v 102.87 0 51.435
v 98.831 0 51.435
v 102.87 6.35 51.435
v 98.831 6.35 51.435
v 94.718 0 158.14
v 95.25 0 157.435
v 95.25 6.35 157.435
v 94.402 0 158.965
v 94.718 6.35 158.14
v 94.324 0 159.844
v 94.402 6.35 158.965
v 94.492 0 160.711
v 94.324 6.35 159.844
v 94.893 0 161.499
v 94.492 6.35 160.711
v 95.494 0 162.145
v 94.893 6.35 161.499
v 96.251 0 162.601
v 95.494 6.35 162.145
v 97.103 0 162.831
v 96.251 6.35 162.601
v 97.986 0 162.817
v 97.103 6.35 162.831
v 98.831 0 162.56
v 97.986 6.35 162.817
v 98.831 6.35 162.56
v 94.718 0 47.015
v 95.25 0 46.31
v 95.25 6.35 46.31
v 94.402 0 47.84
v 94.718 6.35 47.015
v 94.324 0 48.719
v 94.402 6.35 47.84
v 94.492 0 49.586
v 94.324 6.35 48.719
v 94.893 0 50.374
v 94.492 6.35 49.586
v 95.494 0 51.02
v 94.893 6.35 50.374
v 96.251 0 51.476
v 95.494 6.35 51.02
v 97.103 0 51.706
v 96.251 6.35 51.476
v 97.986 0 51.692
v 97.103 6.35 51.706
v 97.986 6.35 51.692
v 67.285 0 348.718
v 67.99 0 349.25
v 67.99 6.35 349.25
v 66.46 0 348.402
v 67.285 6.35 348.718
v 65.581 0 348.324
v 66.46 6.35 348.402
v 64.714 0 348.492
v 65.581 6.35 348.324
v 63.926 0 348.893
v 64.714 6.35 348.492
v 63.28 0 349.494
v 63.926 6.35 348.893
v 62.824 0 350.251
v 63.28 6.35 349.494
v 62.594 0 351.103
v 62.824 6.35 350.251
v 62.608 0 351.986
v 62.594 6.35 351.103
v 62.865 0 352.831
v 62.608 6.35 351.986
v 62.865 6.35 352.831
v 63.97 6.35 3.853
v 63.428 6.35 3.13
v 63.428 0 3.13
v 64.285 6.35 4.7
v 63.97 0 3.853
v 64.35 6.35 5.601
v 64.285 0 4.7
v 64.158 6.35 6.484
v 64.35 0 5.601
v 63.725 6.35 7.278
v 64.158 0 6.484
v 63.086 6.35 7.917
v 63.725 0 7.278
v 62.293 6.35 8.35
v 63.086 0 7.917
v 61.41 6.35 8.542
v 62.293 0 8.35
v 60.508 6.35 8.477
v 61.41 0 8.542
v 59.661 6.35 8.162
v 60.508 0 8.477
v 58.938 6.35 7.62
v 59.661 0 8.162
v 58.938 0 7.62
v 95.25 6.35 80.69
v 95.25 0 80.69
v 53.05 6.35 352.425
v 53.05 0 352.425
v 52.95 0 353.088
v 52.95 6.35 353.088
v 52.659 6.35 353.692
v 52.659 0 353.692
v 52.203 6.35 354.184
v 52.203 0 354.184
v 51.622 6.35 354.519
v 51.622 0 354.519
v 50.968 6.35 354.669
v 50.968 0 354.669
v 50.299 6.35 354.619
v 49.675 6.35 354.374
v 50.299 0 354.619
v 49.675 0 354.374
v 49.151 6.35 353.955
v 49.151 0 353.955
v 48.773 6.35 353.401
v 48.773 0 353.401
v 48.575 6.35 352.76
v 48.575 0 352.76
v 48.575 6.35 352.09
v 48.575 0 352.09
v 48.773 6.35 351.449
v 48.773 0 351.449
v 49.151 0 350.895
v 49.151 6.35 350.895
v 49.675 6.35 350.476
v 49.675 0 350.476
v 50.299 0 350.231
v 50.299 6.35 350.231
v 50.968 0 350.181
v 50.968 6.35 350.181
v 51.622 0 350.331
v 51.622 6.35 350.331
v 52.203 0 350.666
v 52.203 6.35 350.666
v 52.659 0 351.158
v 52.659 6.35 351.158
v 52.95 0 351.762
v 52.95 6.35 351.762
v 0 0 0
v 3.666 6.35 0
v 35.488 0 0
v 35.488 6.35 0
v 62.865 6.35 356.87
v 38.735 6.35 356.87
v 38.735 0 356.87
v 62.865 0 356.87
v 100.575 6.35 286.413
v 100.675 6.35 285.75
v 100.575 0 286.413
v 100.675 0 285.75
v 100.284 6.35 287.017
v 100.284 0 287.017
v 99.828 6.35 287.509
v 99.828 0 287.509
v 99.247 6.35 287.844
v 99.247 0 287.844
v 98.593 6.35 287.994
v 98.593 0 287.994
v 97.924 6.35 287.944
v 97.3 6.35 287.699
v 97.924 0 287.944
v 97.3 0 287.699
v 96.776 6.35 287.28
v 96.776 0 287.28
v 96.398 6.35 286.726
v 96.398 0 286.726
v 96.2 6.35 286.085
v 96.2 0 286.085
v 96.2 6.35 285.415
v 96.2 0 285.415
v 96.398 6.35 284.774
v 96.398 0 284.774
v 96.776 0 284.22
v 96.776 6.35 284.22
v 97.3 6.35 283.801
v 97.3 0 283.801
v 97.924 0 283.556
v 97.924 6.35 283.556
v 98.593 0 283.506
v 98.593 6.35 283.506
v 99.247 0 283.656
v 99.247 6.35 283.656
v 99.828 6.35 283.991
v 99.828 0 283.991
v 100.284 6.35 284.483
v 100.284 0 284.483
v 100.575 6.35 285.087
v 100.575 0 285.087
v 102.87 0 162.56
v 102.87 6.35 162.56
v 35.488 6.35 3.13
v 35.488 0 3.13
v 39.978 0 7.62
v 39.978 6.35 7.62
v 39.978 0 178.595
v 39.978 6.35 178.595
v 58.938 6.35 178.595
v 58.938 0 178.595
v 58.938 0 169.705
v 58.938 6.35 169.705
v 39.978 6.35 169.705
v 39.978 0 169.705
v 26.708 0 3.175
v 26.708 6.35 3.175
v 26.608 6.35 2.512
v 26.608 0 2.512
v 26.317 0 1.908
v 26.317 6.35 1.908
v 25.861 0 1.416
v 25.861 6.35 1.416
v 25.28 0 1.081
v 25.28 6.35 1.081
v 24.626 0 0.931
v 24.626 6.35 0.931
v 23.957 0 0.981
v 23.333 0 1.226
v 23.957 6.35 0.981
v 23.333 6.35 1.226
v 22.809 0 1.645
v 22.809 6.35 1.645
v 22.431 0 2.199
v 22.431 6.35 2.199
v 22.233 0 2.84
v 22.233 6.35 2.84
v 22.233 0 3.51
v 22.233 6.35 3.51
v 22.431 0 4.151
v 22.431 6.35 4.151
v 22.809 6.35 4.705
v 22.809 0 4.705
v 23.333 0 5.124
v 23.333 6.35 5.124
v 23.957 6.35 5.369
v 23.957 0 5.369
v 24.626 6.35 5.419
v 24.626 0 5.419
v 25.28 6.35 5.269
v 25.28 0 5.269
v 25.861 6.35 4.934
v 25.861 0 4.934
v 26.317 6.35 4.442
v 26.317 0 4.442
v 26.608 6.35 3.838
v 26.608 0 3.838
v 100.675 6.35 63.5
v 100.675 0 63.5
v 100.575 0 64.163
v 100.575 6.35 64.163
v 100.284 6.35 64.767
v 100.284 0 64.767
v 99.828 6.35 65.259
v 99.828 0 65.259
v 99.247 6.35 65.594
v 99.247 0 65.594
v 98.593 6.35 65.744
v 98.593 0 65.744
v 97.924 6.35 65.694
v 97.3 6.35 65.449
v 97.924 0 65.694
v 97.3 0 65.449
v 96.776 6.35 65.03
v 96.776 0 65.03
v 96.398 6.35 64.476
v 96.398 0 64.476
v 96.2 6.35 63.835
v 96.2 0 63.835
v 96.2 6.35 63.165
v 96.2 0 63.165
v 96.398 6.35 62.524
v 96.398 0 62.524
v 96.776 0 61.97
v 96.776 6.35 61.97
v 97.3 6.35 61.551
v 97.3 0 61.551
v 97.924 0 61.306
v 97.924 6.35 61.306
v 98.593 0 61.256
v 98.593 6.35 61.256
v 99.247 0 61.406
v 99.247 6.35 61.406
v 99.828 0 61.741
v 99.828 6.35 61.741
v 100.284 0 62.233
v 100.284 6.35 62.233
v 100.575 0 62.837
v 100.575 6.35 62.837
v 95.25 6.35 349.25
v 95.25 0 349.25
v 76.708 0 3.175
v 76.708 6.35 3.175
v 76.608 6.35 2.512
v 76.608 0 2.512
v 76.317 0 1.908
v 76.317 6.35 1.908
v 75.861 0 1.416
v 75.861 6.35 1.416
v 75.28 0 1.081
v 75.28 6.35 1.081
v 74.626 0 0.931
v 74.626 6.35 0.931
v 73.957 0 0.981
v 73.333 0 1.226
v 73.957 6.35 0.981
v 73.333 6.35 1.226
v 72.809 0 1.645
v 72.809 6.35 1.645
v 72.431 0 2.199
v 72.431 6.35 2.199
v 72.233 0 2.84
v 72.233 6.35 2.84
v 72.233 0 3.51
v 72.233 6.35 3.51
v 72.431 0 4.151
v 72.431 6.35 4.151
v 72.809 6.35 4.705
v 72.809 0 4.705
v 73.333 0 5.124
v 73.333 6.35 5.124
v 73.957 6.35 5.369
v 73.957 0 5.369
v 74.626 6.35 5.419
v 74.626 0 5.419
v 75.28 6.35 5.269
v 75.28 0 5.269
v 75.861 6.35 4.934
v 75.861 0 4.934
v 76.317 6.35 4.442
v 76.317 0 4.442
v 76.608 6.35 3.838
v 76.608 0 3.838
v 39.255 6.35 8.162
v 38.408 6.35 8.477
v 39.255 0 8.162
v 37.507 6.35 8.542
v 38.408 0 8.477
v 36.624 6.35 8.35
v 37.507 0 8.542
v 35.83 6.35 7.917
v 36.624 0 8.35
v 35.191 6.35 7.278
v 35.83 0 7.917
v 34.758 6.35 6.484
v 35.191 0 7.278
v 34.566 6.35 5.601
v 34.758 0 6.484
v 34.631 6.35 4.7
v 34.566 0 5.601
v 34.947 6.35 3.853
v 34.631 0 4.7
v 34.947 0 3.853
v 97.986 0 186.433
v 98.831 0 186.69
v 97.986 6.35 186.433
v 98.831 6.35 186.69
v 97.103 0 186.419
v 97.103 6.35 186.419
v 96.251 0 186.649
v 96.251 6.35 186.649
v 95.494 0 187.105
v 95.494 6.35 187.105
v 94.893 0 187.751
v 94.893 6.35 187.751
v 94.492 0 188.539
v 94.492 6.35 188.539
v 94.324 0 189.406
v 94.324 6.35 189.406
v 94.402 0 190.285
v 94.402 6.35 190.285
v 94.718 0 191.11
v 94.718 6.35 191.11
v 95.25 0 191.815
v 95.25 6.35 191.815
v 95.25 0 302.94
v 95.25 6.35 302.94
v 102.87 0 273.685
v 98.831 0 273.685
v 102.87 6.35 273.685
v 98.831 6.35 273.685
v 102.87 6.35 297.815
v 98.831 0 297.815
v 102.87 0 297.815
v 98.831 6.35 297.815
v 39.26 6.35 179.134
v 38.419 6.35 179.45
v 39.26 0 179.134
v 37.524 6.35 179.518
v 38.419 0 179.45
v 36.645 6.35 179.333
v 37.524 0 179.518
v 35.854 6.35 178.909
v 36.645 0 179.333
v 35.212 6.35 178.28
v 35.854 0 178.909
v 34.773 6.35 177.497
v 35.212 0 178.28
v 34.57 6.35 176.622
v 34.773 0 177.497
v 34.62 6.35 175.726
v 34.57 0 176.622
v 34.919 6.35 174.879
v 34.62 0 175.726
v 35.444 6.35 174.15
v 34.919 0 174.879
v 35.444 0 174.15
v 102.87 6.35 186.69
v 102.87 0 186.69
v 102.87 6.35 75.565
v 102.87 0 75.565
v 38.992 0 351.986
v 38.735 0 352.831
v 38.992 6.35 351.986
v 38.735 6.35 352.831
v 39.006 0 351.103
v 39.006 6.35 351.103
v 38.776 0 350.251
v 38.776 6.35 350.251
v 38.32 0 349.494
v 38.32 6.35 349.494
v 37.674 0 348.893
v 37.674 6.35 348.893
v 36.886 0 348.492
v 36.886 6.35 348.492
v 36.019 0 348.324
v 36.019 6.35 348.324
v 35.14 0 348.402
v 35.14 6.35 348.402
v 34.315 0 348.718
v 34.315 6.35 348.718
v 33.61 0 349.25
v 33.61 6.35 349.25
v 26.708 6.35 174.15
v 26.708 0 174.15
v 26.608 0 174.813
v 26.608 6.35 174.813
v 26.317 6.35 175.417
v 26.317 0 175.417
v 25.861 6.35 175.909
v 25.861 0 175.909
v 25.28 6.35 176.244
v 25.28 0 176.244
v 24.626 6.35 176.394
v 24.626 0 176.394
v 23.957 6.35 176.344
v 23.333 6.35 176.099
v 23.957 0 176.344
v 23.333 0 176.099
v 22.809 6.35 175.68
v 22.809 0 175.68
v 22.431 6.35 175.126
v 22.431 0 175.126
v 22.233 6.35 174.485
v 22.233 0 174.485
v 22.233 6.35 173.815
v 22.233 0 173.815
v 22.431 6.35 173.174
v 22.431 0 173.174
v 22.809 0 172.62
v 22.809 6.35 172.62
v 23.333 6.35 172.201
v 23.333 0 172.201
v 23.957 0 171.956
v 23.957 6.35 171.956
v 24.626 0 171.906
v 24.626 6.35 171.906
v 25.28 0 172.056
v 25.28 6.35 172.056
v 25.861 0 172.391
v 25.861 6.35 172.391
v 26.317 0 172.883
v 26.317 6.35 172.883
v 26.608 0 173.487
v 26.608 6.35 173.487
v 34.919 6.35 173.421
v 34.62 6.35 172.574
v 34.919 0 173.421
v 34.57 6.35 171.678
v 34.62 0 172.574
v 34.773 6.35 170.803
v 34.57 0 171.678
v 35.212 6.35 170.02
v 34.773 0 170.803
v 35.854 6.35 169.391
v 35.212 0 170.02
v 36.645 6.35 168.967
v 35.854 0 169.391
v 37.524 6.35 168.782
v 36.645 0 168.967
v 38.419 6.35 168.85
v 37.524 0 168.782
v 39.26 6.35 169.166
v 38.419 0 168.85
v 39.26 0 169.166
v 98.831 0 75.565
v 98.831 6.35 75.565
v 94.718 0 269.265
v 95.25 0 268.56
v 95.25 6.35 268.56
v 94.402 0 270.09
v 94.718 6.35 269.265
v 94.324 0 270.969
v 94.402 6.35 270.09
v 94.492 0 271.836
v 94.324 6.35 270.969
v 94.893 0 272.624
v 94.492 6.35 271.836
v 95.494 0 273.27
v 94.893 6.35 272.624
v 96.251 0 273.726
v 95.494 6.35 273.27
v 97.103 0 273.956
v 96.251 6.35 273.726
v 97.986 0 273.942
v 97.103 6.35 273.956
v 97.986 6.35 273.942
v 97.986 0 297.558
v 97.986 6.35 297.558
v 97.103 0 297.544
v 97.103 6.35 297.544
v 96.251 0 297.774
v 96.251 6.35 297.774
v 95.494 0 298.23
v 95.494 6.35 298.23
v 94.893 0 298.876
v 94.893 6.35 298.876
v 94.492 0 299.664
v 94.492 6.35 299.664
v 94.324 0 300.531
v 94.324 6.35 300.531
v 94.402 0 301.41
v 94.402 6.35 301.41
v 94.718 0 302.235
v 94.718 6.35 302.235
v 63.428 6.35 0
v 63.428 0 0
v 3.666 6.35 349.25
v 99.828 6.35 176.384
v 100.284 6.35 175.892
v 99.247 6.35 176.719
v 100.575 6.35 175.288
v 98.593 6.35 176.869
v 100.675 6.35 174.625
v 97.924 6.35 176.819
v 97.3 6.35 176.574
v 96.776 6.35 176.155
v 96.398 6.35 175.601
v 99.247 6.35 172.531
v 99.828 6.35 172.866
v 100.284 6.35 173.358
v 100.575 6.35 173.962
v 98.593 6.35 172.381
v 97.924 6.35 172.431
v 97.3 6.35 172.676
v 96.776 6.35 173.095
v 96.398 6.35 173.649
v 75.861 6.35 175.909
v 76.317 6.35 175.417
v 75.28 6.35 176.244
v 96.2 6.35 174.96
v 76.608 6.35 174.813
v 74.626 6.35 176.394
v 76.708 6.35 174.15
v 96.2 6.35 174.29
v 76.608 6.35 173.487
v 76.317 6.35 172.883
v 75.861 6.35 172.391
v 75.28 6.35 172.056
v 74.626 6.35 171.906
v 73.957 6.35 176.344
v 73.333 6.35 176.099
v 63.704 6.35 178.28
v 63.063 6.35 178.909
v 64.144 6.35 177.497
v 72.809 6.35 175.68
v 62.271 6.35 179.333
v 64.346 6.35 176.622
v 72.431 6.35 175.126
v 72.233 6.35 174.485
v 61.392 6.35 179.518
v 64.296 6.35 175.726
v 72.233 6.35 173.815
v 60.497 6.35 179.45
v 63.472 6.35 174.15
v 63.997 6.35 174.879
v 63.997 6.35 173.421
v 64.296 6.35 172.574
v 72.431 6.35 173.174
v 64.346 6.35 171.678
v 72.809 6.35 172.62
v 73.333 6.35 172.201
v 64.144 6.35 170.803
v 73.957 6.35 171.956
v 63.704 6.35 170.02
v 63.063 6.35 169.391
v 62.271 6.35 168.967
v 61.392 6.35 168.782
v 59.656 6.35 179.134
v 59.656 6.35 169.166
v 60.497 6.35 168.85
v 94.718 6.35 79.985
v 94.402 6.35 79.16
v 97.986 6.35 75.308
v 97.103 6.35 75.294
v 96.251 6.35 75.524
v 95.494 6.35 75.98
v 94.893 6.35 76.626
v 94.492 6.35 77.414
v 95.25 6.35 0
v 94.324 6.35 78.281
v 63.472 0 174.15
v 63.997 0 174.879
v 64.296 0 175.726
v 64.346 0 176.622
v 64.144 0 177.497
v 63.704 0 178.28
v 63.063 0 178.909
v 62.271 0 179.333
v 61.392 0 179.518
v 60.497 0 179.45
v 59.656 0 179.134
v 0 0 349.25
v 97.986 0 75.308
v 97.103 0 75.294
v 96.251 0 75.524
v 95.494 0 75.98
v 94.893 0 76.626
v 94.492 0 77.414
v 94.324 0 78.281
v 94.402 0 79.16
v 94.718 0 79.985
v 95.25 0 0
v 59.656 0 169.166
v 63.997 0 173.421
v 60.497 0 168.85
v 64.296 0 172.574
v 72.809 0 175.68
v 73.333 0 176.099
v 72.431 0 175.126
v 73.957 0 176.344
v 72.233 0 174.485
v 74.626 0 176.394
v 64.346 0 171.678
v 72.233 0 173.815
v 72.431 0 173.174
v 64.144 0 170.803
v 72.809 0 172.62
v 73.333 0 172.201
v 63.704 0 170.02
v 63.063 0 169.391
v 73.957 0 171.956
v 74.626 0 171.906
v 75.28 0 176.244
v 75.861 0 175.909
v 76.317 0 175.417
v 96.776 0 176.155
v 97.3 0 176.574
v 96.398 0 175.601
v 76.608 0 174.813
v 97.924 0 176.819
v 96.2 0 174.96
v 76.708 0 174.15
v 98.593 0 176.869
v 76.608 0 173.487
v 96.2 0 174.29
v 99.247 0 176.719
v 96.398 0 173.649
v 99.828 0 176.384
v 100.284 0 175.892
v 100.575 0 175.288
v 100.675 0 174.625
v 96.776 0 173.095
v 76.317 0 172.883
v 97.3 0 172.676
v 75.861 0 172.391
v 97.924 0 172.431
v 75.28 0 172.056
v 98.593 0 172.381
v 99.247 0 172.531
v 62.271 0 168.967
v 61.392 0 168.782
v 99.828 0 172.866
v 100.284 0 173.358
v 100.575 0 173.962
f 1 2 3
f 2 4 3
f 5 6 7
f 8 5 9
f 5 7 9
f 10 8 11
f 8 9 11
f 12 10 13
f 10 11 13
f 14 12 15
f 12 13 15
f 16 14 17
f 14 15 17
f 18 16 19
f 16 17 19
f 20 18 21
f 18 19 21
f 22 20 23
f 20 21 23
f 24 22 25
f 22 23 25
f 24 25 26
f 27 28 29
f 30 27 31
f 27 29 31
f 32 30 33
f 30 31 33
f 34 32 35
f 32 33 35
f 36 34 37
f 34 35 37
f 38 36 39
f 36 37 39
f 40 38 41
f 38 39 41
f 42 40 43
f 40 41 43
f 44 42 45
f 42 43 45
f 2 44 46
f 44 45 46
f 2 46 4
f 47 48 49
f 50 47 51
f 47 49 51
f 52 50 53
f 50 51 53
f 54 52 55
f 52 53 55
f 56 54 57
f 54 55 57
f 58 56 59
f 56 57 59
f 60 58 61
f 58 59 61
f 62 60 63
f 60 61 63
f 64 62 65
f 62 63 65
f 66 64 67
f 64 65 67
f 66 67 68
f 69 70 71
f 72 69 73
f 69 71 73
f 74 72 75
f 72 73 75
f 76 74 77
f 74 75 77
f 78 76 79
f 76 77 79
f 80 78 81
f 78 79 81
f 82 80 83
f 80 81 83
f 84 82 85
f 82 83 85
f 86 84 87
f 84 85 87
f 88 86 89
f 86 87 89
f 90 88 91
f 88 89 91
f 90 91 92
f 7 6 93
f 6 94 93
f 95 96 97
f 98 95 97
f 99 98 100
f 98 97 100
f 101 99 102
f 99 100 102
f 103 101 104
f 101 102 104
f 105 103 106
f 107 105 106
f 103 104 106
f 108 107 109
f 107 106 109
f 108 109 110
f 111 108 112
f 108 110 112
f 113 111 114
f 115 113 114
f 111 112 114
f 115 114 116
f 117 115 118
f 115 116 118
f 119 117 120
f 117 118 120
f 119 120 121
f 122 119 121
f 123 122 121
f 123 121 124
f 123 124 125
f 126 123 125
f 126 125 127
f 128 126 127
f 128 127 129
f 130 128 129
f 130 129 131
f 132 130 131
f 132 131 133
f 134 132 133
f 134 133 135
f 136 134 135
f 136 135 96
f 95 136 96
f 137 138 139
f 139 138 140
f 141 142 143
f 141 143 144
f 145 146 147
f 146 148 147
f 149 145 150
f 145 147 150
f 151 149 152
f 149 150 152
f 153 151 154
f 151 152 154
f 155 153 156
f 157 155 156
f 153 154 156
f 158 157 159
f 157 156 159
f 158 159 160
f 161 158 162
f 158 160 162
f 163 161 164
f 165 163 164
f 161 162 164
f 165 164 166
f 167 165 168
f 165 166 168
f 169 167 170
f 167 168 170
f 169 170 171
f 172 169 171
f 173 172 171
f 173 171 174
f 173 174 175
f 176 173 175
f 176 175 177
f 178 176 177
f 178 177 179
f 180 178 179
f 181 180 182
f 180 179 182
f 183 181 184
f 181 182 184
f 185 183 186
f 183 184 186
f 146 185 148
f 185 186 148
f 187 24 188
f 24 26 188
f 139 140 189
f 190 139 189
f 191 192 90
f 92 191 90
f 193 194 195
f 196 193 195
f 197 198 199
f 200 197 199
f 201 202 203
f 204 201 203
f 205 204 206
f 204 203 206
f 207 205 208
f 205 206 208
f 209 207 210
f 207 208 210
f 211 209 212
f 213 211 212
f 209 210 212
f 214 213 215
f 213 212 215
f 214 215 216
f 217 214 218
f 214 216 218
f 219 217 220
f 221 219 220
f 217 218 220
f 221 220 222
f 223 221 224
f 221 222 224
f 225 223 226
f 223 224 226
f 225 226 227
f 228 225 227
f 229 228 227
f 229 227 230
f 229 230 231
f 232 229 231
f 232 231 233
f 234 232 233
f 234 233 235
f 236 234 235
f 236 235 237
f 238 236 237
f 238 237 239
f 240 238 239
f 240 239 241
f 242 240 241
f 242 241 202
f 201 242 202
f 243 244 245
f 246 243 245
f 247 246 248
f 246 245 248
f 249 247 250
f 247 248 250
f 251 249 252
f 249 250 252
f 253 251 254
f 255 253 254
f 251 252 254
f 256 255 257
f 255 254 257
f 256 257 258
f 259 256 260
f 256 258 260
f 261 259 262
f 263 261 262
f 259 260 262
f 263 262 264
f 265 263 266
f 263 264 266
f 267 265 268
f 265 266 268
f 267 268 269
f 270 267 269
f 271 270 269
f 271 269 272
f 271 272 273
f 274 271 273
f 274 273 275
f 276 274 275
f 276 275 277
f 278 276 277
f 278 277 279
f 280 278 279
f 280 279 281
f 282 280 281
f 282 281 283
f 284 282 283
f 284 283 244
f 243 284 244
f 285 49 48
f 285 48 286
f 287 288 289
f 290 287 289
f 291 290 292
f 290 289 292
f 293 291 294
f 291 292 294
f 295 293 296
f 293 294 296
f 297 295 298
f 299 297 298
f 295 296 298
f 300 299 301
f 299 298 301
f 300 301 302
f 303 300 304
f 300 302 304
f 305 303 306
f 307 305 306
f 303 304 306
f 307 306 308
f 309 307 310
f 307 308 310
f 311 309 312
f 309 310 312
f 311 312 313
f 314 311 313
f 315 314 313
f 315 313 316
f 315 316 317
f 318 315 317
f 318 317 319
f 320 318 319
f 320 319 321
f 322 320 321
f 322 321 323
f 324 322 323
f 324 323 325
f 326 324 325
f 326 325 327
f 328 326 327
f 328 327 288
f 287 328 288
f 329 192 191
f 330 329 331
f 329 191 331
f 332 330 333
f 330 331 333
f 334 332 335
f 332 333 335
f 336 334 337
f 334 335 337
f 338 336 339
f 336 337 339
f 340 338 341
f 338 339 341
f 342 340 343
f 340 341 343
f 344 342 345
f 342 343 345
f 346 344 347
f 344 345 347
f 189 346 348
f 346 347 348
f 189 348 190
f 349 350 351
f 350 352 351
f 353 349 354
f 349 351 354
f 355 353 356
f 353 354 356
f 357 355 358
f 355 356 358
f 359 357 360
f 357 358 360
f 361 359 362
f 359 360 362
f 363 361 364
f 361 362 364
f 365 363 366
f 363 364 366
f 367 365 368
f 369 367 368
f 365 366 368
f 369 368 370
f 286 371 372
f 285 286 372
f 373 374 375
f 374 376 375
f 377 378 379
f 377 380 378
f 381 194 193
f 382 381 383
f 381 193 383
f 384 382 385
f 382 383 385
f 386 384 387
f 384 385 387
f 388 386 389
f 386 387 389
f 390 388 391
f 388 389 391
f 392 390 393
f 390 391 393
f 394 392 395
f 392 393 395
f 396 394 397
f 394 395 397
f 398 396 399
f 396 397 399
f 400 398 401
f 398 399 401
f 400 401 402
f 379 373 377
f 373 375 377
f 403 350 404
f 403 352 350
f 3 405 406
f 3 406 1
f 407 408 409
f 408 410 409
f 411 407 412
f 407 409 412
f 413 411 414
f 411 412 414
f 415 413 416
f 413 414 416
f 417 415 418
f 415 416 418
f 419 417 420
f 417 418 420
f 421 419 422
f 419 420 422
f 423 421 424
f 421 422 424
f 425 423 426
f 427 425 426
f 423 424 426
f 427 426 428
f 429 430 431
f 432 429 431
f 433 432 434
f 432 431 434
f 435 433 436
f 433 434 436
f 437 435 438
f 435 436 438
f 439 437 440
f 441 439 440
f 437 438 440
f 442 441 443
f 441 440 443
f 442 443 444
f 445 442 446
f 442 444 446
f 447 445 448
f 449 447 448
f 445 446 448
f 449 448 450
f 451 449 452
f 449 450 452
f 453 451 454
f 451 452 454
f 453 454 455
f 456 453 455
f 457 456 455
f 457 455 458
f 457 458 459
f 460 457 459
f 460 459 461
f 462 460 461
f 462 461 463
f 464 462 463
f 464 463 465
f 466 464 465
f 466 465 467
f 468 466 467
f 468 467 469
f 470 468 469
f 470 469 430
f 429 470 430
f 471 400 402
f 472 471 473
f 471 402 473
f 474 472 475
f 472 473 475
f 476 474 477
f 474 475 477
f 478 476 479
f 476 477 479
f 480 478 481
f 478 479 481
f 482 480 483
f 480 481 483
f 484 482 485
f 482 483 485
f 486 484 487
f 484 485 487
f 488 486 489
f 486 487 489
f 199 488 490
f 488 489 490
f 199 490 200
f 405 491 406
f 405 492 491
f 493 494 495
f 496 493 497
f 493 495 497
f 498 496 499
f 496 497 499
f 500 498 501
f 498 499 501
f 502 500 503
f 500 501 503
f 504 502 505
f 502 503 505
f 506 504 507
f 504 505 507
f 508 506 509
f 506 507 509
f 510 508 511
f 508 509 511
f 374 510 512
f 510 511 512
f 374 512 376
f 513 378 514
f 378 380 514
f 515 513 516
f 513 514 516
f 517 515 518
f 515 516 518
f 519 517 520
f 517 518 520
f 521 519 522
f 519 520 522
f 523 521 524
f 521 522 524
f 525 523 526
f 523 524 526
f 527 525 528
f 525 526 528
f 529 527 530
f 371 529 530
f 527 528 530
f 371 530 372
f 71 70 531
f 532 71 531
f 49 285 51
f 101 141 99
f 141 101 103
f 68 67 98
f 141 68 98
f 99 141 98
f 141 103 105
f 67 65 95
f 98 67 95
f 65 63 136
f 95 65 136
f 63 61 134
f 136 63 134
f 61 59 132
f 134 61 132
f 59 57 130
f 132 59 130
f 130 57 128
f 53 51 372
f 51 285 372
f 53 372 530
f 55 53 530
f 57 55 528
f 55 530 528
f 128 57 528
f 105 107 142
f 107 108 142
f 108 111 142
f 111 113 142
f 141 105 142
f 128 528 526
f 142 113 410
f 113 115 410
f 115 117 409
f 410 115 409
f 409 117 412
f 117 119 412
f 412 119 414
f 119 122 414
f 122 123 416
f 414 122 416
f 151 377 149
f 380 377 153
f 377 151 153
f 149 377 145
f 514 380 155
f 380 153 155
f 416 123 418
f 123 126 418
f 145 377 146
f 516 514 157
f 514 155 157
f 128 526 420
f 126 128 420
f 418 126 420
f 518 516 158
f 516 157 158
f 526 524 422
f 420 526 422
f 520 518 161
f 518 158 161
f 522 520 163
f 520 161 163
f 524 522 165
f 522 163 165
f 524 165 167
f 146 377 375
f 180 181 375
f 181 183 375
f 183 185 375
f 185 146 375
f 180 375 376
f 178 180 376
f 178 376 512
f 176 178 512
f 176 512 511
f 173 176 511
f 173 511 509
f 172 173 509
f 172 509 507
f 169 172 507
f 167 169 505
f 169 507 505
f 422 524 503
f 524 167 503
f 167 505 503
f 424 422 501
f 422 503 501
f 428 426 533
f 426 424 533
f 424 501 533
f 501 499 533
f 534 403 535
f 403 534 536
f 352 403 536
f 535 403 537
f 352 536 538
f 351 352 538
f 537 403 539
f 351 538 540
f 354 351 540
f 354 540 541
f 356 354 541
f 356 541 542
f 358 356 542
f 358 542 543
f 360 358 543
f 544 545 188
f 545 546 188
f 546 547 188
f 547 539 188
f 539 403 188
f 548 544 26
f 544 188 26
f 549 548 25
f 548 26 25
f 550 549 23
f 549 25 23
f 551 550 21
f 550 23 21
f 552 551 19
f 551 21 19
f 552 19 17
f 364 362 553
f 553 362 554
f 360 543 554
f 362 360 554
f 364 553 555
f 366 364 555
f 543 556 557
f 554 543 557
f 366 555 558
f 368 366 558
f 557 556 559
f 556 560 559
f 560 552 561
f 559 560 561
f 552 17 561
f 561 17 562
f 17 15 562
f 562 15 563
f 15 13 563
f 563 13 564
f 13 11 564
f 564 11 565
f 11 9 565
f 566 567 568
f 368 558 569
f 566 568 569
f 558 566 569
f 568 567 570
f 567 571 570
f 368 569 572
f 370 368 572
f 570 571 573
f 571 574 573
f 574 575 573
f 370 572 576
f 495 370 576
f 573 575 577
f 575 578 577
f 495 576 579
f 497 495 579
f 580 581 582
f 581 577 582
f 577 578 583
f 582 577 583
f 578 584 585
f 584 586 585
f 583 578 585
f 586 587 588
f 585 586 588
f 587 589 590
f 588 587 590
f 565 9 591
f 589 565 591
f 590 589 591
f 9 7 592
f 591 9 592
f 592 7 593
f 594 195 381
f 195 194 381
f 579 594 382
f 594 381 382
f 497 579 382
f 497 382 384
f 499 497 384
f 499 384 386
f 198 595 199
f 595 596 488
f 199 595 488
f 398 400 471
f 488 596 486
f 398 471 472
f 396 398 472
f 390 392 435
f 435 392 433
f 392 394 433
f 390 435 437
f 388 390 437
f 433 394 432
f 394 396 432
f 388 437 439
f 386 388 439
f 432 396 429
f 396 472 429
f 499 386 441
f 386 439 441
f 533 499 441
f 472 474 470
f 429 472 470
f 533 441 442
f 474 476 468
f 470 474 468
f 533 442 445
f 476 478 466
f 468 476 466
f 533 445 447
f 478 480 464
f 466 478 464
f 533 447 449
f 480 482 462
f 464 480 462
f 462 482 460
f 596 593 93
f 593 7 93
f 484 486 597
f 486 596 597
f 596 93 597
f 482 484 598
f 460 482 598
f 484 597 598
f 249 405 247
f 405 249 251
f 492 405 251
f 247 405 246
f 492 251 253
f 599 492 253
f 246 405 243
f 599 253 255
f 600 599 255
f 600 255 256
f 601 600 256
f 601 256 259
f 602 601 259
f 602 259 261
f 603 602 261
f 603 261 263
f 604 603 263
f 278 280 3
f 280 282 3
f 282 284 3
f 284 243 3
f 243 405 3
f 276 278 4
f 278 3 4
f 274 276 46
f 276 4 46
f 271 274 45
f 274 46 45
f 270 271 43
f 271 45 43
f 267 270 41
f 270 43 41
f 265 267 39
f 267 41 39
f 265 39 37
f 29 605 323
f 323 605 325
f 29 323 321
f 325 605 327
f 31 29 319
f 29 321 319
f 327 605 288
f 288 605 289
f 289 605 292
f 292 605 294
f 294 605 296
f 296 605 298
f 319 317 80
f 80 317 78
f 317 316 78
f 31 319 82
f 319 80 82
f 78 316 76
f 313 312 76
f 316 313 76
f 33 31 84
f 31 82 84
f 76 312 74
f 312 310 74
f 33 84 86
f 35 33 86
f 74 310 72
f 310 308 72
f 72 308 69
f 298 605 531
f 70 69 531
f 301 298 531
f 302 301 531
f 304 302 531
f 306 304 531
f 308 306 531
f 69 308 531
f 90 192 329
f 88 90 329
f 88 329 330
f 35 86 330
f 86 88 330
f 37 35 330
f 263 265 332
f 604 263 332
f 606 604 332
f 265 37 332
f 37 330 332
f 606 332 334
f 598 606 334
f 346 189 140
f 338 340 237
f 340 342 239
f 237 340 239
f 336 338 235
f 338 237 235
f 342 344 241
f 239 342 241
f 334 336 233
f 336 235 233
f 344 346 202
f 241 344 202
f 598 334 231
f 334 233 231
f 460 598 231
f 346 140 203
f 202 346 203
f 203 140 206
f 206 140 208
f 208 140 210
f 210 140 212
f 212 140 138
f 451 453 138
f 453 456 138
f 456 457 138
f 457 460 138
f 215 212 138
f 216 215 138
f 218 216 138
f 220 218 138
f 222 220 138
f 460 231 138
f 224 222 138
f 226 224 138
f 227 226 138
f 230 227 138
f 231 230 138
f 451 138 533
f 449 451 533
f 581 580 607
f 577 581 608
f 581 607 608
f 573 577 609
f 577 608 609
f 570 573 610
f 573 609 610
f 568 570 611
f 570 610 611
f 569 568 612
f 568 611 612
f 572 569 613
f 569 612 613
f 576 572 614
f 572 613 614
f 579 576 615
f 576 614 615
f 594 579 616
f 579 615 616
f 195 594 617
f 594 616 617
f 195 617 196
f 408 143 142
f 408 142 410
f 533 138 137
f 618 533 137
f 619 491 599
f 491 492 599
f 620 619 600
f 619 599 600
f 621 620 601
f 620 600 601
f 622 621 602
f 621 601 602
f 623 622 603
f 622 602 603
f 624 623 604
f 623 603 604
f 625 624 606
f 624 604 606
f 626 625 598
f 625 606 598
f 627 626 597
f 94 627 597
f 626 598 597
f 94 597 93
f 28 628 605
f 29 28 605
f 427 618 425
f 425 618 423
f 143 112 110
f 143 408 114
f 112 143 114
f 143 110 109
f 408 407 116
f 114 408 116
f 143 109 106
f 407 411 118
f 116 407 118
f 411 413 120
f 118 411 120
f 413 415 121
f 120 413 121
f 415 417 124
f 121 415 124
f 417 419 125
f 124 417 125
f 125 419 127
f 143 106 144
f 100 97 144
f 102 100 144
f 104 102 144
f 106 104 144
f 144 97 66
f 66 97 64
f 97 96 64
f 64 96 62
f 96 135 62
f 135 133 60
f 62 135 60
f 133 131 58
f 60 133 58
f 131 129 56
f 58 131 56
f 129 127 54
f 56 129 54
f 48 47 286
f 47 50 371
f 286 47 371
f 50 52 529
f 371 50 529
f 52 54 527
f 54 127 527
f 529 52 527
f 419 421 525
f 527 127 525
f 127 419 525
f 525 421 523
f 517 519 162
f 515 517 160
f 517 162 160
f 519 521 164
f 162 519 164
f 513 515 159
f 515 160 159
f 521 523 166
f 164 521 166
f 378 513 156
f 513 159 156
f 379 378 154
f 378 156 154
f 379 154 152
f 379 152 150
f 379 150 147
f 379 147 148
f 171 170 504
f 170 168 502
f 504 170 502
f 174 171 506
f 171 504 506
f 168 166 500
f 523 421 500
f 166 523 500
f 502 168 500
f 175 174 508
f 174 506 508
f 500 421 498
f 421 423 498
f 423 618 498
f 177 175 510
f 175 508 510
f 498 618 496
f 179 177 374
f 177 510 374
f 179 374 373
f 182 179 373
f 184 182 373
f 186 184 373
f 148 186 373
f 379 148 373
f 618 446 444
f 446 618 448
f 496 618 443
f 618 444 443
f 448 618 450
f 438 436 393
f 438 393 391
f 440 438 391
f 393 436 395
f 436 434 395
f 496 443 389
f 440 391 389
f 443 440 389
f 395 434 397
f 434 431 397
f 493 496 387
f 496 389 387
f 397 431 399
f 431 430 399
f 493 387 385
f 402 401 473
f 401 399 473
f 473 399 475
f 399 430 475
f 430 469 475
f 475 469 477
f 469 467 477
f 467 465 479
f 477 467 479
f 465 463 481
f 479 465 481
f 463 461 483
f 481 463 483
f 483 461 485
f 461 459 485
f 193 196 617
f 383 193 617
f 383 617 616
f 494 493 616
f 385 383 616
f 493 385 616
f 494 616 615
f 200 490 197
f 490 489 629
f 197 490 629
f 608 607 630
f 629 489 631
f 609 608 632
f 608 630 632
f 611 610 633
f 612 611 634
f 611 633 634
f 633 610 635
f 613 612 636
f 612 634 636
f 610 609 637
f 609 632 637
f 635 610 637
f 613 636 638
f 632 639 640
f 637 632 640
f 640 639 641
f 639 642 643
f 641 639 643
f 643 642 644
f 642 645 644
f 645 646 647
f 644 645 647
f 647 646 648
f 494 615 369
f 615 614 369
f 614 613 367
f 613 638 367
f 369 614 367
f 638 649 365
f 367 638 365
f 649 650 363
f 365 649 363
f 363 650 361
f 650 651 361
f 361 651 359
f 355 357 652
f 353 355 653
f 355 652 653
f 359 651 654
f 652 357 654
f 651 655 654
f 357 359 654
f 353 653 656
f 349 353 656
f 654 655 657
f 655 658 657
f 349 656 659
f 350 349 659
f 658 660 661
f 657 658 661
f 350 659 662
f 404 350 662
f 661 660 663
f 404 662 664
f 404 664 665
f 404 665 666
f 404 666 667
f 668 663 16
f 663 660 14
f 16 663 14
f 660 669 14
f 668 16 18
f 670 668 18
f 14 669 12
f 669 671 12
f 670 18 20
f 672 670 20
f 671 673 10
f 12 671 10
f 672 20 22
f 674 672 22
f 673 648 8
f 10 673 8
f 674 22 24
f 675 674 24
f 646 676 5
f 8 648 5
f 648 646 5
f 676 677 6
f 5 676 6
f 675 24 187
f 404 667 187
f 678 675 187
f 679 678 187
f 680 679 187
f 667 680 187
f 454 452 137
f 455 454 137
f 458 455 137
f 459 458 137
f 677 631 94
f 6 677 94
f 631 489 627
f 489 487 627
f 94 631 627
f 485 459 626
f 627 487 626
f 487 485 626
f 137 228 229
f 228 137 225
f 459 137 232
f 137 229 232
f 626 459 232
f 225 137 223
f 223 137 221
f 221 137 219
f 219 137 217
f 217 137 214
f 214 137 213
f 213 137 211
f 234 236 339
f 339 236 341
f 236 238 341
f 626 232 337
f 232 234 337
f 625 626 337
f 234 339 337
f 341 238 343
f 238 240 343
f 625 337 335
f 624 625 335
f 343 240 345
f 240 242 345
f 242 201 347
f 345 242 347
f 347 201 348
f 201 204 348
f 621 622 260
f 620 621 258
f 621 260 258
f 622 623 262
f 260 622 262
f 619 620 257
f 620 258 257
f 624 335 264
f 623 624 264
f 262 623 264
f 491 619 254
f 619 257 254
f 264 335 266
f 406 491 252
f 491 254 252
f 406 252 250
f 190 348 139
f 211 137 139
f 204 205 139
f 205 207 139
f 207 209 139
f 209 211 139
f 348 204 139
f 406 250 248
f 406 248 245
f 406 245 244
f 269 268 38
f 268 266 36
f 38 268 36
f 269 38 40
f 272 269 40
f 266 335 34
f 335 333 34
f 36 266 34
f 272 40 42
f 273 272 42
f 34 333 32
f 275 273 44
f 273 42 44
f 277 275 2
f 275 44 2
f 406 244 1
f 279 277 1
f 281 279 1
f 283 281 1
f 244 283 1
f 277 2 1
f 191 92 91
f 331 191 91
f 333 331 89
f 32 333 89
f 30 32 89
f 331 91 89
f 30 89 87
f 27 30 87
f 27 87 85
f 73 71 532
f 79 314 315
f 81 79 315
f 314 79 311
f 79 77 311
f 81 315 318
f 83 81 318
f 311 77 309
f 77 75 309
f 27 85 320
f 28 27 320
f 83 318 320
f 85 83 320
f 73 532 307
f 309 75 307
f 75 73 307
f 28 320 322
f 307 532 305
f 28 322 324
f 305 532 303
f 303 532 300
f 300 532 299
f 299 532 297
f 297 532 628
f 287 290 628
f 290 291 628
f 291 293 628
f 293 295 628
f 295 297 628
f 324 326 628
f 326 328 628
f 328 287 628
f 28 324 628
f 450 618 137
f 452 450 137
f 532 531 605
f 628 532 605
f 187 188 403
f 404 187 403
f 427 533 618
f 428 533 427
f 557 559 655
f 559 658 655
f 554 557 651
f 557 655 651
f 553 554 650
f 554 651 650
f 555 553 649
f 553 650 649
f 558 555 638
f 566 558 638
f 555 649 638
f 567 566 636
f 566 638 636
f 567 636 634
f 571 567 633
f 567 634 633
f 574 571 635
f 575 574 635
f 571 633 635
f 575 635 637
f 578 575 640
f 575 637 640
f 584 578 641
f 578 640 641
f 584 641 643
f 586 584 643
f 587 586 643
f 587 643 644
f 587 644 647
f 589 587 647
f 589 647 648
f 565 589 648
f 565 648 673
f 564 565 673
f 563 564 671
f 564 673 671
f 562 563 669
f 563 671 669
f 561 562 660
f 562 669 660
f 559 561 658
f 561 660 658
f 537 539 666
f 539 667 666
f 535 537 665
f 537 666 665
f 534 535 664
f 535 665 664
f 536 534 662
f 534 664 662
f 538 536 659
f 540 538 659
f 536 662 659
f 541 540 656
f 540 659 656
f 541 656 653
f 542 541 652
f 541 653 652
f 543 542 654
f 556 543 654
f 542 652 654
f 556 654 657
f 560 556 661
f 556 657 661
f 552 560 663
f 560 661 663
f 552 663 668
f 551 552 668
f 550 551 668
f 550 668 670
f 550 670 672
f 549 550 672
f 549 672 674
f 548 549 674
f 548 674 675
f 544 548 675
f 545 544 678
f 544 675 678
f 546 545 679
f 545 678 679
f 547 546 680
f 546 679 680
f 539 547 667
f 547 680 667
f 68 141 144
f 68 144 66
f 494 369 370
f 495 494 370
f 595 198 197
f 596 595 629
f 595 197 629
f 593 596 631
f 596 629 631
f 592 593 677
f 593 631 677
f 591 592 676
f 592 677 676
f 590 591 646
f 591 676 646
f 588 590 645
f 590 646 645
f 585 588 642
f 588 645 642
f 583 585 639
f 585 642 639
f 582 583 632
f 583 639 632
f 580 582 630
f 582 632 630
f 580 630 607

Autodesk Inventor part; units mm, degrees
ref_plane "YZ Plane" through (0, 0, 0) normal (1, 0, 0) x (0, 1, 0)
ref_plane "XZ Plane" through (0, 0, 0) normal (0, 1, 0) x (-1, 0, 0)
ref_plane "XY Plane" through (0, 0, 0) normal (0, 0, 1) x (1, 0, 0)
sketch "Sketch1" plane through (0, 0, 0) normal (0, 0, 1) x (1, 0, 0)
  line L0 (0, 0) -> (95.25, 0)
  line L1 (95.25, 0) -> (95.25, 6.35)
  line L2 (95.25, 6.35) -> (3.6662, 6.35)
  line L3 (3.6662, 6.35) -> (0, 0)
  dimension "d0" = 95.25
  dimension "d1" = 6.35
  dimension "d2" = 60
extrude "Extrusion1" add sketch "Sketch1" along normal blind 349.25
sketch "Sketch2" plane through (0, 0, 0) normal (0, -1, 0) x (1, 0, 0)
  line L0 (38.1, 349.25) -> (63.5, 349.25)
  line L1 (63.5, 349.25) -> (63.5, 355.6)
  line L2 (63.5, 355.6) -> (38.1, 355.6)
  line L3 (38.1, 355.6) -> (38.1, 349.25)
  line L4 (0, 349.25) -> (101.6, 349.25)
  line L5 (0, 349.25) -> (95.25, 349.25) projected
  point P0 (0, 0)
  point P1 (50.8, 349.25)
  dimension "d5" = 25.4
  dimension "d6" = 6.35
  dimension "d9" = 101.6
extrude "Extrusion2" add sketch "Sketch2" against normal blind 6.35
sketch "Sketch3" plane through (0, 0, 0) normal (0, -1, 0) x (1, 0, 0)
  line L0 (63.5, 349.25) -> (63.5, 355.6) projected
  line L1 (63.5, 355.6) -> (38.1, 355.6) projected
  circle A0 centre (50.8, 352.425) radius 2.25
  point P0 (0, 0)
  point P1 (50.8, 355.6)
  point P2 (63.5, 352.425)
  dimension "d10" = 4.5
extrude "Extrusion3" cut sketch "Sketch3" against normal through all
sketch "Sketch4" plane through (0, 0, 0) normal (0, -1, 0) x (1, 0, 0)
  line L0 (95.25, 0) -> (95.25, 349.25) projected
  line L1 (95.25, 50.8) -> (101.6, 50.8)
  line L2 (101.6, 50.8) -> (101.6, 76.2)
  line L3 (101.6, 76.2) -> (95.25, 76.2)
  line L4 (95.25, 76.2) -> (95.25, 50.8)
  line L5 (95.25, 298.45) -> (101.6, 298.45)
  line L6 (101.6, 298.45) -> (101.6, 273.05)
  line L7 (101.6, 273.05) -> (95.25, 273.05)
  line L8 (95.25, 273.05) -> (95.25, 298.45)
  line L9 (95.25, 187.325) -> (101.6, 187.325)
  line L10 (101.6, 187.325) -> (101.6, 161.925)
  line L11 (101.6, 161.925) -> (95.25, 161.925)
  line L12 (95.25, 161.925) -> (95.25, 187.325)
  circle A0 centre (98.425, 285.75) radius 2.25
  circle A1 centre (98.425, 174.625) radius 2.25
  circle A2 centre (98.425, 63.5) radius 2.25
  point P0 (0, 0)
  point P1 (95.25, 174.625)
  point P2 (98.425, 298.45)
  point P3 (98.425, 187.325)
  point P4 (98.425, 76.2)
  point P5 (101.6, 285.75)
  point P6 (101.6, 174.625)
  point P7 (101.6, 63.5)
  dimension "d14" = 25.4
  dimension "d15" = 6.35
  dimension "d16" = 25.4
  dimension "d18" = 25.4
  dimension "d19" = 50.8
  dimension "d20" = 50.8
  dimension "d21" = 4.5
  dimension "d22" = 4.5
  dimension "d23" = 4.5
extrude "Extrusion4" add sketch "Sketch4" against normal blind 6.35
sketch "Sketch6" plane through (95.25, 0, 298.45) normal (0, 0, 1) x (1, 0, 0)
  line L0 (-95.25, 0) -> (-84.2515, 6.35)
  line L1 (0, 6.35) -> (-91.5838, 6.35) projected
  line L2 (-95.25, 0) -> (0, 0) projected
  line L3 (-84.2515, 6.35) -> (-84.2515, 0)
  line L4 (-91.5838, 6.35) -> (-95.25, 0) projected
  line L5 (-84.2515, 6.35) -> (-84.2515, 6.35)
  line L6 (-84.2515, 6.35) -> (-91.5838, 6.35)
  dimension "d28" = 30
  dimension "d31" = 12.7
extrude "Extrusion6" [suppressed]
sketch "Sketch7" plane through (95.25, 0, 187.325) normal (0, 0, 1) x (1, 0, 0)
  line L0 (-77.9015, 12.7) -> (-77.9015, 6.35) projected
  line L1 (-81.5677, 12.7) -> (-77.9015, 12.7) projected
  line L2 (-88.9, 0) -> (-81.5677, 12.7) projected
  line L3 (-77.9015, 6.35) -> (-88.9, 0) projected
  point P0 (-95.25, 0)
extrude "Extrusion7" [suppressed]
sketch "Sketch8" plane through (95.25, 0, 76.2) normal (0, 0, 1) x (1, 0, 0)
  line L0 (-77.9015, 12.7) -> (-77.9015, 6.35) projected
  line L1 (-81.5677, 12.7) -> (-77.9015, 12.7) projected
  line L2 (-88.9, 0) -> (-81.5677, 12.7) projected
  line L3 (-77.9015, 6.35) -> (-88.9, 0) projected
  point P0 (-95.25, 0)
extrude "Extrusion8" [suppressed]
sketch "Sketch10" plane through (3.6662, 6.35, 0) normal (0, 1, 0) x (1, 0, 0)
  circle A0 centre (20.7919, -3.175) radius 2.25
  line L0 (90.648, -6.35) -> (0.9358, -6.35)
  circle A1 centre (70.7919, -3.175) radius 2.25
  line L1 (33.0919, -6.35) -> (58.4919, -6.35)
  line L2 (58.4919, -6.35) -> (58.4919, 0)
  line L3 (58.4919, 0) -> (33.0919, 0)
  line L4 (33.0919, 0) -> (33.0919, -6.35)
  line L5 (20.7919, -3.175) -> (70.7919, -3.175) construction
  line L6 (91.5838, 0) -> (0, 0) projected
  point P0 (-3.6662, 0)
  point P1 (45.7919, -3.175)
  point P2 (45.7919, -6.35)
  point P3 (45.7919, -6.35)
  point P4 (45.7919, 0)
  point P5 (33.0919, -3.175)
  dimension "d39" = 4.5
  dimension "d41" = 4.5
  dimension "d42" = 25.4
  dimension "d43" = 6.35
  dimension "d44" = 50
extrude "Extrusion10" cut sketch "Sketch10" against normal through all
sketch "Sketch11" plane through (38.1, 0, 355.6) normal (0, -1, 0) x (1, 0, 0)
  line L0 (24.0581, -184.625) -> (-1.3419, -184.625)
  line L1 (-1.3419, -184.625) -> (-1.3419, -178.275)
  line L2 (-1.3419, -178.275) -> (24.0581, -178.275)
  line L3 (24.0581, -178.275) -> (24.0581, -184.625)
  line L4 (63.5, -168.275) -> (57.15, -168.275) projected
  line L5 (-1.3419, -349.25) -> (24.0581, -349.25) projected
  point P0 (-38.1, -355.6)
  point P1 (11.3581, -184.625)
  point P2 (11.3581, -349.25)
  dimension "d47" = 25.4
  dimension "d48" = 6.35
  dimension "d85" = 10
extrude "Extrusion11" cut sketch "Sketch11" against normal through all
sketch "Sketch12" plane through (38.1, 0, 355.6) normal (0, -1, 0) x (1, 0, 0)
  circle A0 centre (-13.6419, -181.45) radius 2.25
  circle A1 centre (36.3581, -181.45) radius 2.25
  circle A2 centre (-13.6419, -352.425) radius 2.25 projected
  circle A3 centre (36.3581, -352.425) radius 2.25 projected
  line L0 (24.0581, -178.275) -> (24.0581, -184.625) projected
  point P0 (-38.1, -355.6)
  point P1 (24.0581, -181.45)
  dimension "d52" = 4.5
  dimension "d53" = 4.5
extrude "Extrusion12" cut sketch "Sketch12" against normal through all contours A0 | A1
sketch "Sketch13" plane through (3.6662, 6.35, 349.25) normal (0, 1, 0) x (1, 0, 0)
  line L0 (58.4919, 349.25) -> (91.5838, 349.25) projected
  line L1 (59.7619, 349.25) -> (31.8219, 349.25)
  line L2 (31.8219, 349.25) -> (31.8219, 341.63)
  line L3 (31.8219, 341.63) -> (59.7619, 341.63)
  line L4 (59.7619, 341.63) -> (59.7619, 349.25)
  line L5 (59.7619, 179.545) -> (31.8219, 179.545)
  line L6 (31.8219, 179.545) -> (31.8219, 170.655)
  line L7 (31.8219, 170.655) -> (59.7619, 170.655)
  line L8 (59.7619, 170.655) -> (59.7619, 179.545)
  line L9 (58.4919, 342.9) -> (33.0919, 342.9) projected
  line L10 (33.0919, 178.275) -> (58.4919, 178.275) projected
  line L11 (58.4919, 178.275) -> (58.4919, 171.925) projected
  circle A0 centre (62.0789, -2.2451) radius 3.175
  circle A1 centre (32.1888, -2.2451) radius 3.175
  circle A2 centre (93.8289, 48.5549) radius 3.175
  circle A3 centre (93.8289, 78.4451) radius 3.175
  circle A4 centre (93.8289, 159.6799) radius 3.175
  circle A5 centre (93.8289, 189.5701) radius 3.175
  circle A6 centre (93.8289, 270.8049) radius 3.175
  circle A7 centre (93.8289, 300.6951) radius 3.175
  line L12 (97.9338, 298.45) -> (91.5838, 298.45) projected
  line L13 (91.5838, 298.45) -> (93.8289, 300.6951)
  line L14 (62.0789, -2.2451) -> (59.8338, 0) construction
  line L15 (59.8338, -6.35) -> (59.8338, 0) projected
  point P0 (-3.6662, 349.25)
  point P1 (45.7919, 342.9)
  point P2 (45.7919, 341.63)
  point P3 (45.7919, 178.275)
  point P4 (45.7919, 179.545)
  point P5 (58.4919, 175.1)
  point P6 (59.7619, 175.1)
  point P7 (91.5838, 273.05)
  point P8 (91.5838, 187.325)
  point P9 (91.5838, 161.925)
  point P10 (91.5838, 50.8)
  point P11 (91.5838, 76.2)
  point P12 (34.4338, 0)
  dimension "d61" = 6.35
  dimension "d62" = 6.35
  dimension "d63" = 6.35
  dimension "d64" = 6.35
  dimension "d65" = 6.35
  dimension "d66" = 6.35
  dimension "d67" = 6.35
  dimension "d68" = 6.35
  dimension "d56" = 1.27
  dimension "d57" = 1.27
  dimension "d58" = 1.27
  dimension "d69" = 45
  dimension "d70" = 45
extrude "Extrusion13" cut sketch "Sketch13" against normal through all
sketch "Sketch14" plane through (3.6662, 6.35, 349.25) normal (0, 1, 0) x (1, 0, 0)
  line L0 (97.9338, 50.8) -> (96.074, 50.8) projected
  line L1 (97.9338, 50.8) -> (95.1652, 50.8)
  line L2 (95.1652, 50.8) -> (95.1652, 51.435)
  line L3 (95.1652, 51.435) -> (97.9338, 51.435)
  line L4 (97.9338, 51.435) -> (97.9338, 50.8)
  line L5 (97.9338, 50.8) -> (97.9338, 76.2) projected
  line L6 (97.9338, 76.2) -> (95.1652, 76.2)
  line L7 (95.1652, 76.2) -> (95.1652, 75.565)
  line L8 (95.1652, 75.565) -> (97.9338, 75.565)
  line L9 (97.9338, 75.565) -> (97.9338, 76.2)
  line L10 (97.9338, 161.925) -> (96.074, 161.925) projected
  line L11 (97.9338, 161.925) -> (95.1652, 161.925)
  line L12 (95.1652, 161.925) -> (95.1652, 162.56)
  line L13 (95.1652, 162.56) -> (97.9338, 162.56)
  line L14 (97.9338, 162.56) -> (97.9338, 161.925)
  line L15 (96.074, 187.325) -> (97.9338, 187.325) projected
  line L16 (97.9338, 187.325) -> (95.1652, 187.325)
  line L17 (95.1652, 187.325) -> (95.1652, 186.69)
  line L18 (95.1652, 186.69) -> (97.9338, 186.69)
  line L19 (97.9338, 186.69) -> (97.9338, 187.325)
  line L20 (97.9338, 273.05) -> (97.9338, 298.45) projected
  line L21 (97.9338, 273.05) -> (95.1652, 273.05)
  line L22 (95.1652, 273.05) -> (95.1652, 273.685)
  line L23 (95.1652, 273.685) -> (97.9338, 273.685)
  line L24 (97.9338, 273.685) -> (97.9338, 273.05)
  line L25 (97.9338, 298.45) -> (95.1652, 298.45)
  line L26 (95.1652, 298.45) -> (95.1652, 297.815)
  line L27 (95.1652, 297.815) -> (97.9338, 297.815)
  line L28 (97.9338, 297.815) -> (97.9338, 298.45)
  arc A0 (91.5838, 302.9401) -> (96.074, 298.45) centre (93.8289, 300.6951) ccw projected
  line L29 (34.4338, -6.35) -> (59.8338, -6.35) projected
  arc A1 (64.324, 0) -> (59.8338, -4.4901) centre (62.0789, -2.2451) ccw projected
  line L30 (59.8338, -6.35) -> (59.1988, -6.35)
  line L31 (59.1988, -6.35) -> (59.1988, -3.5814)
  line L32 (59.1988, -3.5814) -> (59.8338, -3.5814)
  line L33 (59.8338, -3.5814) -> (59.8338, -6.35)
  line L34 (34.4338, -4.4901) -> (34.4338, -6.35) projected
  arc A2 (34.4338, -4.4901) -> (29.9437, 0) centre (32.1888, -2.2451) ccw projected
  line L35 (34.4338, -6.35) -> (35.0688, -6.35)
  line L36 (35.0688, -6.35) -> (35.0688, -3.5814)
  line L37 (35.0688, -3.5814) -> (34.4338, -3.5814)
  line L38 (34.4338, -3.5814) -> (34.4338, -6.35)
  point P0 (-3.6662, 349.25)
  dimension "d6" = 6.35
  dimension "d71" = 0.635
  dimension "d72" = 0.635
  dimension "d73" = 0.635
  dimension "d74" = 0.635
  dimension "d75" = 0.635
  dimension "d76" = 0.635
  dimension "d77" = 0.635
extrude "Extrusion14" cut sketch "Sketch14" against normal through all
sketch "Sketch15" plane through (3.6662, 6.35, 349.25) normal (0, 1, 0) x (1, 0, 0)
  line L0 (97.9338, 273.685) -> (95.1652, 273.685) projected
  line L1 (97.9338, 273.685) -> (99.2038, 273.685)
  line L2 (99.2038, 273.685) -> (99.2038, 297.815)
  line L3 (99.2038, 297.815) -> (97.9338, 297.815)
  line L4 (97.9338, 297.815) -> (97.9338, 273.685)
  line L5 (97.9338, 186.69) -> (99.2038, 186.69)
  line L6 (99.2038, 186.69) -> (99.2038, 162.56)
  line L7 (99.2038, 162.56) -> (97.9338, 162.56)
  line L8 (97.9338, 162.56) -> (97.9338, 186.69)
  line L9 (97.9338, 51.435) -> (97.9338, 75.565) projected
  line L10 (97.9338, 75.565) -> (99.2038, 75.565)
  line L11 (99.2038, 75.565) -> (99.2038, 51.435)
  line L12 (99.2038, 51.435) -> (97.9338, 51.435)
  line L13 (97.9338, 51.435) -> (97.9338, 75.565)
  line L14 (35.0688, -6.35) -> (59.1988, -6.35) projected
  line L15 (59.1988, -6.35) -> (35.0688, -6.35)
  line L16 (35.0688, -6.35) -> (35.0688, -7.62)
  line L17 (35.0688, -7.62) -> (59.1988, -7.62)
  line L18 (59.1988, -7.62) -> (59.1988, -6.35)
  point P0 (-3.6662, 349.25)
  dimension "d80" = 1.27
  dimension "d81" = 1.27
extrude "Extrusion15" add sketch "Sketch15" against normal blind 6.35
sketch "Sketch16" plane through (0, 0, 0) normal (0, -1, 0) x (1, 0, 0)
  line L0 (35.4881, 169.705) -> (35.4881, 178.595) construction
  line L1 (35.4881, 178.595) -> (63.4281, 178.595) construction
  line L2 (63.4281, 178.595) -> (63.4281, 169.705) construction
  line L3 (63.4281, 169.705) -> (35.4881, 169.705) construction
  circle A0 centre (24.4581, 174.15) radius 2.25 construction
  circle A1 centre (74.4581, 174.15) radius 2.25 construction
  circle A2 centre (50.8, 352.425) radius 2.25 construction
  circle A3 centre (98.425, 174.625) radius 2.25 construction
  circle A4 centre (98.425, 63.5) radius 2.25 construction
  circle A5 centre (98.425, 285.75) radius 2.25 construction
  circle A6 centre (24.4581, 3.175) radius 2.25 construction
  circle A7 centre (74.4581, 3.175) radius 2.25 construction
  line L4 (62.865, 352.8314) -> (62.865, 356.87) construction
  line L5 (62.865, 356.87) -> (38.735, 356.87) construction
  line L6 (38.735, 356.87) -> (38.735, 352.8314) construction
  arc A8 (33.6099, 349.25) -> (38.735, 352.8314) centre (35.8549, 351.4951) ccw construction
  line L7 (0, 349.25) -> (33.6099, 349.25) construction
  line L8 (0, 0) -> (0, 349.25) construction
  line L9 (0, 0) -> (35.4881, 0) construction
  line L10 (35.4881, 0) -> (35.4881, 7.62) construction
  line L11 (35.4881, 7.62) -> (63.4281, 7.62) construction
  line L12 (63.4281, 7.62) -> (63.4281, 0) construction
  line L13 (63.4281, 0) -> (95.25, 0) construction
  line L14 (95.25, 0) -> (95.25, 46.3099) construction
  arc A9 (98.8314, 51.435) -> (95.25, 46.3099) centre (97.4951, 48.5549) ccw construction
  line L15 (98.8314, 51.435) -> (102.87, 51.435) construction
  line L16 (102.87, 51.435) -> (102.87, 75.565) construction
  line L17 (102.87, 75.565) -> (98.8314, 75.565) construction
  arc A10 (95.25, 80.6901) -> (98.8314, 75.565) centre (97.4951, 78.4451) ccw construction
  line L18 (95.25, 80.6901) -> (95.25, 157.4349) construction
  arc A11 (98.8314, 162.56) -> (95.25, 157.4349) centre (97.4951, 159.6799) ccw construction
  line L19 (98.8314, 162.56) -> (102.87, 162.56) construction
  line L20 (102.87, 162.56) -> (102.87, 186.69) construction
  line L21 (102.87, 186.69) -> (98.8314, 186.69) construction
  arc A12 (95.25, 191.8151) -> (98.8314, 186.69) centre (97.4951, 189.5701) ccw construction
  line L22 (95.25, 191.8151) -> (95.25, 268.5599) construction
  arc A13 (98.8314, 273.685) -> (95.25, 268.5599) centre (97.4951, 270.8049) ccw construction
  line L23 (98.8314, 273.685) -> (102.87, 273.685) construction
  line L24 (102.87, 273.685) -> (102.87, 297.815) construction
  line L25 (102.87, 297.815) -> (98.8314, 297.815) construction
  arc A14 (95.25, 302.9401) -> (98.8314, 297.815) centre (97.4951, 300.6951) ccw construction
  line L26 (95.25, 302.9401) -> (95.25, 349.25) construction
  line L27 (67.9901, 349.25) -> (95.25, 349.25) construction
  arc A15 (62.865, 352.8314) -> (67.9901, 349.25) centre (65.7451, 351.4951) ccw construction
  line L28 (37.7332, 171.9501) -> (37.7332, 176.3499) construction
  line L29 (37.7332, 176.3499) -> (61.183, 176.3499) construction
  line L30 (61.183, 176.3499) -> (61.183, 171.9501) construction
  line L31 (61.183, 171.9501) -> (37.7332, 171.9501) construction
  line L32 (61.183, 5.3749) -> (37.7332, 5.3749) construction
  line L33 (37.7332, 5.3749) -> (37.7332, -2.2451) construction
  line L34 (37.7332, -2.2451) -> (-2.2451, -2.2451) construction
  line L35 (-2.2451, -2.2451) -> (-2.2451, 351.4951) construction
  line L36 (-2.2451, 351.4951) -> (36.4899, 351.4951) construction
  line L37 (36.4899, 351.4951) -> (36.4899, 359.1151) construction
  line L38 (36.4899, 359.1151) -> (65.1101, 359.1151) construction
  line L39 (65.1101, 359.1151) -> (65.1101, 351.4951) construction
  line L40 (65.1101, 351.4951) -> (97.4951, 351.4951) construction
  line L41 (97.4951, 351.4951) -> (97.4951, 300.0601) construction
  line L42 (97.4951, 300.0601) -> (105.1151, 300.0601) construction
  line L43 (105.1151, 300.0601) -> (105.1151, 271.4399) construction
  line L44 (105.1151, 271.4399) -> (97.4951, 271.4399) construction
  line L45 (97.4951, 271.4399) -> (97.4951, 188.9351) construction
  line L46 (97.4951, 188.9351) -> (105.1151, 188.9351) construction
  line L47 (105.1151, 188.9351) -> (105.1151, 160.3149) construction
  line L48 (105.1151, 160.3149) -> (97.4951, 160.3149) construction
  line L49 (97.4951, 160.3149) -> (97.4951, 77.8101) construction
  line L50 (97.4951, 77.8101) -> (105.1151, 77.8101) construction
  line L51 (105.1151, 77.8101) -> (105.1151, 49.1899) construction
  line L52 (105.1151, 49.1899) -> (97.4951, 49.1899) construction
  line L53 (97.4951, 49.1899) -> (97.4951, -2.2451) construction
  line L54 (97.4951, -2.2451) -> (61.183, -2.2451) construction
  line L55 (61.183, -2.2451) -> (61.183, 5.3749) construction
  circle A16 centre (61.183, 176.3499) radius 3.175
  circle A17 centre (61.183, 171.9501) radius 3.175
  circle A18 centre (37.7332, 171.9501) radius 3.175
  circle A19 centre (37.7332, 176.3499) radius 3.175
  line L56 (35.4881, 7.62) -> (63.4281, 7.62) projected
  circle A20 centre (61.183, 5.3749) radius 3.175
  circle A21 centre (37.7332, 5.3749) radius 3.175
  dimension "d86" = 6.35
  dimension "d87" = 6.35
extrude "Extrusion16" cut sketch "Sketch16" against normal through all
equation "\"d1\" = Panel_Thickness"
equation "\"d6\" = Panel_Thickness"
equation "\"d7\" = Panel_Thickness"
equation "\"d15\" = Panel_Thickness"
equation "\"d24\" = Panel_Thickness"
equation "\"d43\" = Panel_Thickness"
equation "\"d48\" = Panel_Thickness"
equation "\"d61\" = d63"
equation "\"d62\" = d61"
equation "\"d63\" = d65"
equation "\"d64\" = d65"
equation "\"d65\" = d68"
equation "\"d66\" = d68"
equation "\"d67\" = d68"
equation "\"d68\" = Tool_Dia"
equation "\"d56\" = Fit_Tolerance"
equation "\"d57\" = Fit_Tolerance"
equation "\"d58\" = Fit_Tolerance"
equation "\"d71\" = 0.5 * Fit_Tolerance"
equation "\"d72\" = 0.5 * Fit_Tolerance"
equation "\"d73\" = 0.5 * Fit_Tolerance"
equation "\"d74\" = 0.5 * Fit_Tolerance"
equation "\"d75\" = 0.5 * Fit_Tolerance"
equation "\"d76\" = 0.5 * Fit_Tolerance"
equation "\"d77\" = 0.5 * Fit_Tolerance"
equation "\"d80\" = Fit_Tolerance"
equation "\"d81\" = Fit_Tolerance"
equation "\"d82\" = Panel_Thickness"
equation "\"d86\" = Tool_Dia"
equation "\"d87\" = Tool_Dia"
equation "\"Panel_Thickness\" = 6.35"
equation "\"Fit_Tolerance\" = 1.27"
equation "\"Tool_Dia\" = 6.35"
properties part number "BA03" material "Polyethylene, High Density"
